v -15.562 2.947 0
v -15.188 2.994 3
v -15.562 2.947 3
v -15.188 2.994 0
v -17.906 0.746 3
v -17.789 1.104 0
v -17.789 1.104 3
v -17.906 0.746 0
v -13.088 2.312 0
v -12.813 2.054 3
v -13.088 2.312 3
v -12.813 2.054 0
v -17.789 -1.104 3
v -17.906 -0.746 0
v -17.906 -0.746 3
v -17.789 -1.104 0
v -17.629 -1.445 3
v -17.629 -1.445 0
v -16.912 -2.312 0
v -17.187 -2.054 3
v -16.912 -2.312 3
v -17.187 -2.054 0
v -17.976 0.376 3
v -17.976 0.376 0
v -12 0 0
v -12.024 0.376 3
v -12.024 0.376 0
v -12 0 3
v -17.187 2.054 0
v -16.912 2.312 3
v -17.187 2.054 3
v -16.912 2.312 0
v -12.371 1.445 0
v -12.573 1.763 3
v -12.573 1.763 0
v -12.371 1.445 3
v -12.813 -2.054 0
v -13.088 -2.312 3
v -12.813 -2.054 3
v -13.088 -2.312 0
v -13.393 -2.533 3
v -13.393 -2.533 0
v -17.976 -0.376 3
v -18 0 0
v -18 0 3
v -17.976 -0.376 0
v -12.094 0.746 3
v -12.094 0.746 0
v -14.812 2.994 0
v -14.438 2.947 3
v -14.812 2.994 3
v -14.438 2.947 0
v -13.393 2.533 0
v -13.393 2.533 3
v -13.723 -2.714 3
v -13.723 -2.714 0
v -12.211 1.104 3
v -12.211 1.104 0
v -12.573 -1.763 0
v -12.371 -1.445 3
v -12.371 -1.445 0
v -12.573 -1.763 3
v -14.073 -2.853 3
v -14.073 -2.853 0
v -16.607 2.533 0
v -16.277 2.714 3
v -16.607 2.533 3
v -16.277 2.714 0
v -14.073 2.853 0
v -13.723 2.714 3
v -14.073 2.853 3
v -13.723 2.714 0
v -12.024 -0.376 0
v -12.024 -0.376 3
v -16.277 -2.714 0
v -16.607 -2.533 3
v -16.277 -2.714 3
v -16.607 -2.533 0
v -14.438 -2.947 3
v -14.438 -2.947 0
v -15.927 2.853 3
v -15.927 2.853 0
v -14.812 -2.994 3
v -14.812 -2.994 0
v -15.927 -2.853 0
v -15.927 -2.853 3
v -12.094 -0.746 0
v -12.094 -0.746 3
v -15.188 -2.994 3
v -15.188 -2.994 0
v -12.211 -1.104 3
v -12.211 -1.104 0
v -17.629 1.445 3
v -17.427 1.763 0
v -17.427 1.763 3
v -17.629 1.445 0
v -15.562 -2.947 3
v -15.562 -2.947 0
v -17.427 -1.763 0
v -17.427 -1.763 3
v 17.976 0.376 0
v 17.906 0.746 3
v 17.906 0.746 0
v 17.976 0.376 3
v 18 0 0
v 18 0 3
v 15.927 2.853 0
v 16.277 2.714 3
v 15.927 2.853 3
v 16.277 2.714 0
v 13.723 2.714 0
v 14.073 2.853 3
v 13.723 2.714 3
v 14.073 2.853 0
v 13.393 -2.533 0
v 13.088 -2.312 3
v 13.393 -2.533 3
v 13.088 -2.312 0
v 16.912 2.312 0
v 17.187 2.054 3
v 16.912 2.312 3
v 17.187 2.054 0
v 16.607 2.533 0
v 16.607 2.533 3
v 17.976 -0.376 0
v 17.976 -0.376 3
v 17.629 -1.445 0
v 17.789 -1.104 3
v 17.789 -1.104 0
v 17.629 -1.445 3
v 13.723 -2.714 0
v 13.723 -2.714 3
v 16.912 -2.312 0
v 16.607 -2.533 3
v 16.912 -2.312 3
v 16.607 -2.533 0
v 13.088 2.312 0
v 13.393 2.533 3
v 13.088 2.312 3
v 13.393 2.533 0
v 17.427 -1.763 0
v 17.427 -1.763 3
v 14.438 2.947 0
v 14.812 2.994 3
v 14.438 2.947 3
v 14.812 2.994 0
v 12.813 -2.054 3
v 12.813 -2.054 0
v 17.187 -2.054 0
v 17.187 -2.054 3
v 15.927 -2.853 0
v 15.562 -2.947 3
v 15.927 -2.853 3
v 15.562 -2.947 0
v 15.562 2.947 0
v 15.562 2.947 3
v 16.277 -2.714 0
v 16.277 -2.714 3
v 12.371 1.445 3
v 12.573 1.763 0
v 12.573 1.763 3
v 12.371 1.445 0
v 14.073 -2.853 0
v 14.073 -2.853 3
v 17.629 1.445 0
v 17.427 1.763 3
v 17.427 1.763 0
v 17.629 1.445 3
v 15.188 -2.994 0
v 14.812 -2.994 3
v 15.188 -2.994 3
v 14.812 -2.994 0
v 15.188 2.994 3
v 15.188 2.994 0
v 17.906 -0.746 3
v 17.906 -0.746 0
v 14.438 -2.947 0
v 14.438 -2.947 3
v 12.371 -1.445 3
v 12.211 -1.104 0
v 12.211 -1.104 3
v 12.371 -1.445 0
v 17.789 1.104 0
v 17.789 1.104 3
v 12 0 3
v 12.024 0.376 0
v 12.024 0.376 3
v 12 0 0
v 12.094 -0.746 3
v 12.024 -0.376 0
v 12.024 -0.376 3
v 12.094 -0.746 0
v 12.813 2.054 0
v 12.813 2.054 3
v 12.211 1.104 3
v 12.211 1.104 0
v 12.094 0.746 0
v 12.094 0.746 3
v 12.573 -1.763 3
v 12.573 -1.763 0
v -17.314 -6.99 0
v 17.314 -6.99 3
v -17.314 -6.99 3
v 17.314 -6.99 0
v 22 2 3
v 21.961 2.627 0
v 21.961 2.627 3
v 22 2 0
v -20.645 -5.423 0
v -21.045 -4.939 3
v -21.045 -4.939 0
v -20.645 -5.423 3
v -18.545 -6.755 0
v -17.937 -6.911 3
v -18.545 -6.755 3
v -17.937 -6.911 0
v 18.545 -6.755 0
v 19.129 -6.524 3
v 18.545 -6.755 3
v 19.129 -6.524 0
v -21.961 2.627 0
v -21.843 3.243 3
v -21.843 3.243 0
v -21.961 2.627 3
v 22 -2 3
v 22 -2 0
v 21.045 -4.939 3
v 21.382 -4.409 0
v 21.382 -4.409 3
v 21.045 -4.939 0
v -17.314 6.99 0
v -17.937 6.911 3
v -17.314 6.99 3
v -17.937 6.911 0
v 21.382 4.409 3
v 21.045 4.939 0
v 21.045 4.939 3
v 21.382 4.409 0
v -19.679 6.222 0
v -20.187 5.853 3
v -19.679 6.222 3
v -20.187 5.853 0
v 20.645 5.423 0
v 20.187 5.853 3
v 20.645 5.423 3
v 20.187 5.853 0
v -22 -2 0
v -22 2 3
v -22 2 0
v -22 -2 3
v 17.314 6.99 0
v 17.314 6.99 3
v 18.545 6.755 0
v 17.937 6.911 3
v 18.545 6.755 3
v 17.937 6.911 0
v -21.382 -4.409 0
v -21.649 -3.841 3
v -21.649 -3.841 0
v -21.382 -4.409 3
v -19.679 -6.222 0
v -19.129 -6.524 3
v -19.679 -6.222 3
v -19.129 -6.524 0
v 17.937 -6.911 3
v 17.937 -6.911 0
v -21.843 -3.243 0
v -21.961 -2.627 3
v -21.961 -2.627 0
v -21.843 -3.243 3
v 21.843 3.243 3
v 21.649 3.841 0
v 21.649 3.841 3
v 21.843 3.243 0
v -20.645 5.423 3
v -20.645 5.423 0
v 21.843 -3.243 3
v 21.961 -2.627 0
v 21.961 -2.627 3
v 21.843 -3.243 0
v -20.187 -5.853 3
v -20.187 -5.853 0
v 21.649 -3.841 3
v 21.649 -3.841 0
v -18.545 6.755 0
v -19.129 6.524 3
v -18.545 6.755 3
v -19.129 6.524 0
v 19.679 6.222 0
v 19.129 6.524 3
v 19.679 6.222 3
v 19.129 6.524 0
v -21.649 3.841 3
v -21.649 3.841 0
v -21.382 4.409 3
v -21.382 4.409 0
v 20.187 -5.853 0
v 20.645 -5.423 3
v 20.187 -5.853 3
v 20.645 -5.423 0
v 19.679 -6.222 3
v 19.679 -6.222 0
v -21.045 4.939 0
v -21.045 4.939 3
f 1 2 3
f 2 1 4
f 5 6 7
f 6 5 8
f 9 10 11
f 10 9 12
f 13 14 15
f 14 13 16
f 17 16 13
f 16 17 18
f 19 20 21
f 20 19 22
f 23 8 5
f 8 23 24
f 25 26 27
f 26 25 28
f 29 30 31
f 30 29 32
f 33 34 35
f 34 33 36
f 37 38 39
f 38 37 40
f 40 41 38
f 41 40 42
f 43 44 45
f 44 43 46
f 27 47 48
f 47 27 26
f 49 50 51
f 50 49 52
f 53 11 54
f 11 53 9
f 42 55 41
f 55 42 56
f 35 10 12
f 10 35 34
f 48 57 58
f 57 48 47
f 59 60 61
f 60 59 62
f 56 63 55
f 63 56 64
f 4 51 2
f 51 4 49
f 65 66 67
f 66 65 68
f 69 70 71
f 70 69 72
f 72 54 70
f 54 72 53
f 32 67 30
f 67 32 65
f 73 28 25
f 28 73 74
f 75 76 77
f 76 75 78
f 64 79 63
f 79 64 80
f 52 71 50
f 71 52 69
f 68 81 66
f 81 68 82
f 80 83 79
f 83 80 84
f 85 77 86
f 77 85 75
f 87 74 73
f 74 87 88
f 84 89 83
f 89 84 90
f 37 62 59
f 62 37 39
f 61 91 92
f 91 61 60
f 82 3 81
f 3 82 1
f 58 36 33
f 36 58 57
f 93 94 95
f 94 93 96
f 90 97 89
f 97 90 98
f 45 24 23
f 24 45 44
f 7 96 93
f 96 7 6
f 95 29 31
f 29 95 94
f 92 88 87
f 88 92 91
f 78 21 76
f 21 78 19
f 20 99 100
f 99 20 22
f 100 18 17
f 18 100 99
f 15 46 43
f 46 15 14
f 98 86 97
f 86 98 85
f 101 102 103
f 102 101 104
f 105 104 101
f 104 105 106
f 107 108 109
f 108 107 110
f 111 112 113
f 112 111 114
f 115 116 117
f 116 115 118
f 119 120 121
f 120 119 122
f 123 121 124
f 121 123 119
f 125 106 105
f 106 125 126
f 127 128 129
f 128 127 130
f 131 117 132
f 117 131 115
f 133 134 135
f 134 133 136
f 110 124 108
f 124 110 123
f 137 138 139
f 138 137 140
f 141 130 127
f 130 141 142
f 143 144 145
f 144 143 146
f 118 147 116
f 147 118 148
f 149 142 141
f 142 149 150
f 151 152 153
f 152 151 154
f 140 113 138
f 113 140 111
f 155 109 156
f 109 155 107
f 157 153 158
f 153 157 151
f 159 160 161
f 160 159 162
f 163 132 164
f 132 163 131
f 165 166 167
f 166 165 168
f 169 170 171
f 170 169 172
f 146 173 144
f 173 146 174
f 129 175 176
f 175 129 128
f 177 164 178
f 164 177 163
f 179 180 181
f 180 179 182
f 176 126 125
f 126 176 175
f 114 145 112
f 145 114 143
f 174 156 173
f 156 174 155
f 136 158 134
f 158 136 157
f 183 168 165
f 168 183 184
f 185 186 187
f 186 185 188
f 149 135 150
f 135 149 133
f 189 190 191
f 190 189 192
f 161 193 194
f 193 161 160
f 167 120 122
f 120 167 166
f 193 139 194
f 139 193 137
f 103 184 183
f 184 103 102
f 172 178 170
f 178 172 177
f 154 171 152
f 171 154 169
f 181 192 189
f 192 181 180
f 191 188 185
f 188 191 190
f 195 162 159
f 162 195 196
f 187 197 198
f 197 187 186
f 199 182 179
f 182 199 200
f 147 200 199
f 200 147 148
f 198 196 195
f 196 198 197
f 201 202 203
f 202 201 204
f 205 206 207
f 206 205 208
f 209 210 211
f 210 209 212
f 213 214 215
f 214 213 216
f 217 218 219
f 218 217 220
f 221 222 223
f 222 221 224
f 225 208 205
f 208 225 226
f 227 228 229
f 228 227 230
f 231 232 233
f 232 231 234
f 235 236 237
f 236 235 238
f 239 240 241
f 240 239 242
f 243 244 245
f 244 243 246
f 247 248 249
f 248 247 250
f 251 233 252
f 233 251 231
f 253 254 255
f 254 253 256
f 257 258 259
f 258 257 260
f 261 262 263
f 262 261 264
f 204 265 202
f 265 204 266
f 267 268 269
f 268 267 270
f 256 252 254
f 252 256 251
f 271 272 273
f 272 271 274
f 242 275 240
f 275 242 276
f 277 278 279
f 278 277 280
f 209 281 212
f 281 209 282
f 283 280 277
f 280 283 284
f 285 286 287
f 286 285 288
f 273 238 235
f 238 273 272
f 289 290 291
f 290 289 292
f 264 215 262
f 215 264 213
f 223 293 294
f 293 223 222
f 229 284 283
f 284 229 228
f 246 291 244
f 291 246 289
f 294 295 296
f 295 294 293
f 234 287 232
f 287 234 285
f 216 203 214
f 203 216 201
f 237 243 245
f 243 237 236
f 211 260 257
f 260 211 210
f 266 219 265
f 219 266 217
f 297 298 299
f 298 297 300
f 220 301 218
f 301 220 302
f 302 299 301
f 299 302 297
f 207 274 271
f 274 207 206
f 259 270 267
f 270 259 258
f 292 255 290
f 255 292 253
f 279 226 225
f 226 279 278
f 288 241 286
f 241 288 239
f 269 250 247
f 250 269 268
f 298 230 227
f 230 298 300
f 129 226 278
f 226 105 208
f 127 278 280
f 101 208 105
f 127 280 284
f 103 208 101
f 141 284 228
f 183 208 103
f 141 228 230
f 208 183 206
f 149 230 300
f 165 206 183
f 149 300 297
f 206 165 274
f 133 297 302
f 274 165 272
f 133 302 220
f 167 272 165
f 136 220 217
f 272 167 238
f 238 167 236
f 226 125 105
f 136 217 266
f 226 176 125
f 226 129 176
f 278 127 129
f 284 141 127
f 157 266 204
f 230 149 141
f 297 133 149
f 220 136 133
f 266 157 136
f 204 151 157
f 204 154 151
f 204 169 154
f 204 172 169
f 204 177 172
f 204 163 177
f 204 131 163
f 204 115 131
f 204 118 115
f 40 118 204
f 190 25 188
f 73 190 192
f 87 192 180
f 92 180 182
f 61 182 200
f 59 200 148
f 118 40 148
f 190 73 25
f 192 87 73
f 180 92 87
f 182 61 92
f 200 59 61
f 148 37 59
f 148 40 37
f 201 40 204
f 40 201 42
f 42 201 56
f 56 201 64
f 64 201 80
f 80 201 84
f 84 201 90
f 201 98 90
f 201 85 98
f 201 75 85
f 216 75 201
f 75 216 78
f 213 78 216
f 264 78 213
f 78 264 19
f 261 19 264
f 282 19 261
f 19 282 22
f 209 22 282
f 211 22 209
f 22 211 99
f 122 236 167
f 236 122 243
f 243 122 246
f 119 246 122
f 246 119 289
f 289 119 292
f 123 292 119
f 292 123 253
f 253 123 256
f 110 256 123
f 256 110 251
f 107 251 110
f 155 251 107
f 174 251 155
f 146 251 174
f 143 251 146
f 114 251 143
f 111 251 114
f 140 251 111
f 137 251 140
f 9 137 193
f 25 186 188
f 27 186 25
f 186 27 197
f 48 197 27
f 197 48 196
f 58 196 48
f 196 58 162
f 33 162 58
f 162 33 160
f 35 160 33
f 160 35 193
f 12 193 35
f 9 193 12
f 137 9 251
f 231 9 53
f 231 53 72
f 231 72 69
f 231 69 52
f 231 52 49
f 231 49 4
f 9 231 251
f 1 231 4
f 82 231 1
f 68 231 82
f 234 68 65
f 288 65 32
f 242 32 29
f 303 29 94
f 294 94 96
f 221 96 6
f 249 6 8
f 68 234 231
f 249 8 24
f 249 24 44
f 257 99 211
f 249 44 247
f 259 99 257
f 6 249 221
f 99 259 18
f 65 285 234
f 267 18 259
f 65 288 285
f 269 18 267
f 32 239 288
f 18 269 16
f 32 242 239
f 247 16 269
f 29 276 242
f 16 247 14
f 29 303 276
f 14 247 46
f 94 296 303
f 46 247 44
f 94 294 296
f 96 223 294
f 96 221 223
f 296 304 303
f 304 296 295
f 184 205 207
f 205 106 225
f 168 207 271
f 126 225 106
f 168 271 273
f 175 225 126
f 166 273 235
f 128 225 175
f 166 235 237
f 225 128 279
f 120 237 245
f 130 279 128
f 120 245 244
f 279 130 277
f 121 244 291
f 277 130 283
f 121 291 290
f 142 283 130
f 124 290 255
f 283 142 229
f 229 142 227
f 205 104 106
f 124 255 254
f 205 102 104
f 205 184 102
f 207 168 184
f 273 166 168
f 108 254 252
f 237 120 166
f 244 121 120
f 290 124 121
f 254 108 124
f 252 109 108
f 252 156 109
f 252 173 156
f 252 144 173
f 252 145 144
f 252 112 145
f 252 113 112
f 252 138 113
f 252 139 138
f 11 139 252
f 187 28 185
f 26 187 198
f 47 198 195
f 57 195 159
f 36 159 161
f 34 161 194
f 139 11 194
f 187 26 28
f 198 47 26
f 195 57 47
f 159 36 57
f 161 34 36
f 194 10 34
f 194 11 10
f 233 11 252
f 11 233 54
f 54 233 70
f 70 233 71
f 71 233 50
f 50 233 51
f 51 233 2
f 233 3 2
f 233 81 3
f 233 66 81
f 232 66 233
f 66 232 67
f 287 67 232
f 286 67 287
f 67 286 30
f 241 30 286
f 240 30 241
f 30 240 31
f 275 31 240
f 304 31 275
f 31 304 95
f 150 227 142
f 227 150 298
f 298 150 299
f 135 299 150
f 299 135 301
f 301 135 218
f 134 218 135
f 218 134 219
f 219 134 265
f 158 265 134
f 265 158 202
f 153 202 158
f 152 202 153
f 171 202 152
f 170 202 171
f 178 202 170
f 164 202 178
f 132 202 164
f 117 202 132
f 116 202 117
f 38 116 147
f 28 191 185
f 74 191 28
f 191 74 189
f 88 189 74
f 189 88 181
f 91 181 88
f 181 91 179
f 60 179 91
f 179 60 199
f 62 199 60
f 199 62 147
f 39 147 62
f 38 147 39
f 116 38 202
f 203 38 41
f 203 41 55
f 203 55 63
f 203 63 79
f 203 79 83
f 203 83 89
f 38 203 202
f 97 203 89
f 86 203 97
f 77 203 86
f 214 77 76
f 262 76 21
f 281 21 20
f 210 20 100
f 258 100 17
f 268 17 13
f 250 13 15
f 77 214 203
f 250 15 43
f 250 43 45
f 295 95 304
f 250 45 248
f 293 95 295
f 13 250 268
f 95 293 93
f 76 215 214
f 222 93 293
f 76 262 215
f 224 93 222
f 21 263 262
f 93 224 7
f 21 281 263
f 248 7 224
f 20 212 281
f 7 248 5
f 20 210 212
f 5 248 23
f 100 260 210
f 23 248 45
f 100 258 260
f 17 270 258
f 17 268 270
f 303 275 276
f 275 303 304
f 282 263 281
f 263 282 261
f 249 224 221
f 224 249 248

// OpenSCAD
$fn = 50;


difference() {
	union() {
		hull() {
			translate(v = [-17.0000000000, 2.0000000000, 0]) {
				cylinder(h = 3, r = 5);
			}
			translate(v = [17.0000000000, 2.0000000000, 0]) {
				cylinder(h = 3, r = 5);
			}
			translate(v = [-17.0000000000, -2.0000000000, 0]) {
				cylinder(h = 3, r = 5);
			}
			translate(v = [17.0000000000, -2.0000000000, 0]) {
				cylinder(h = 3, r = 5);
			}
		}
	}
	union() {
		translate(v = [-15.0000000000, 0.0000000000, -100.0000000000]) {
			cylinder(h = 200, r = 3.0000000000);
		}
		translate(v = [-15.0000000000, 0.0000000000, -100.0000000000]) {
			cylinder(h = 200, r = 3.0000000000);
		}
		translate(v = [15.0000000000, 0.0000000000, -100.0000000000]) {
			cylinder(h = 200, r = 3.0000000000);
		}
		translate(v = [15.0000000000, 0.0000000000, -100.0000000000]) {
			cylinder(h = 200, r = 3.0000000000);
		}
	}
}
